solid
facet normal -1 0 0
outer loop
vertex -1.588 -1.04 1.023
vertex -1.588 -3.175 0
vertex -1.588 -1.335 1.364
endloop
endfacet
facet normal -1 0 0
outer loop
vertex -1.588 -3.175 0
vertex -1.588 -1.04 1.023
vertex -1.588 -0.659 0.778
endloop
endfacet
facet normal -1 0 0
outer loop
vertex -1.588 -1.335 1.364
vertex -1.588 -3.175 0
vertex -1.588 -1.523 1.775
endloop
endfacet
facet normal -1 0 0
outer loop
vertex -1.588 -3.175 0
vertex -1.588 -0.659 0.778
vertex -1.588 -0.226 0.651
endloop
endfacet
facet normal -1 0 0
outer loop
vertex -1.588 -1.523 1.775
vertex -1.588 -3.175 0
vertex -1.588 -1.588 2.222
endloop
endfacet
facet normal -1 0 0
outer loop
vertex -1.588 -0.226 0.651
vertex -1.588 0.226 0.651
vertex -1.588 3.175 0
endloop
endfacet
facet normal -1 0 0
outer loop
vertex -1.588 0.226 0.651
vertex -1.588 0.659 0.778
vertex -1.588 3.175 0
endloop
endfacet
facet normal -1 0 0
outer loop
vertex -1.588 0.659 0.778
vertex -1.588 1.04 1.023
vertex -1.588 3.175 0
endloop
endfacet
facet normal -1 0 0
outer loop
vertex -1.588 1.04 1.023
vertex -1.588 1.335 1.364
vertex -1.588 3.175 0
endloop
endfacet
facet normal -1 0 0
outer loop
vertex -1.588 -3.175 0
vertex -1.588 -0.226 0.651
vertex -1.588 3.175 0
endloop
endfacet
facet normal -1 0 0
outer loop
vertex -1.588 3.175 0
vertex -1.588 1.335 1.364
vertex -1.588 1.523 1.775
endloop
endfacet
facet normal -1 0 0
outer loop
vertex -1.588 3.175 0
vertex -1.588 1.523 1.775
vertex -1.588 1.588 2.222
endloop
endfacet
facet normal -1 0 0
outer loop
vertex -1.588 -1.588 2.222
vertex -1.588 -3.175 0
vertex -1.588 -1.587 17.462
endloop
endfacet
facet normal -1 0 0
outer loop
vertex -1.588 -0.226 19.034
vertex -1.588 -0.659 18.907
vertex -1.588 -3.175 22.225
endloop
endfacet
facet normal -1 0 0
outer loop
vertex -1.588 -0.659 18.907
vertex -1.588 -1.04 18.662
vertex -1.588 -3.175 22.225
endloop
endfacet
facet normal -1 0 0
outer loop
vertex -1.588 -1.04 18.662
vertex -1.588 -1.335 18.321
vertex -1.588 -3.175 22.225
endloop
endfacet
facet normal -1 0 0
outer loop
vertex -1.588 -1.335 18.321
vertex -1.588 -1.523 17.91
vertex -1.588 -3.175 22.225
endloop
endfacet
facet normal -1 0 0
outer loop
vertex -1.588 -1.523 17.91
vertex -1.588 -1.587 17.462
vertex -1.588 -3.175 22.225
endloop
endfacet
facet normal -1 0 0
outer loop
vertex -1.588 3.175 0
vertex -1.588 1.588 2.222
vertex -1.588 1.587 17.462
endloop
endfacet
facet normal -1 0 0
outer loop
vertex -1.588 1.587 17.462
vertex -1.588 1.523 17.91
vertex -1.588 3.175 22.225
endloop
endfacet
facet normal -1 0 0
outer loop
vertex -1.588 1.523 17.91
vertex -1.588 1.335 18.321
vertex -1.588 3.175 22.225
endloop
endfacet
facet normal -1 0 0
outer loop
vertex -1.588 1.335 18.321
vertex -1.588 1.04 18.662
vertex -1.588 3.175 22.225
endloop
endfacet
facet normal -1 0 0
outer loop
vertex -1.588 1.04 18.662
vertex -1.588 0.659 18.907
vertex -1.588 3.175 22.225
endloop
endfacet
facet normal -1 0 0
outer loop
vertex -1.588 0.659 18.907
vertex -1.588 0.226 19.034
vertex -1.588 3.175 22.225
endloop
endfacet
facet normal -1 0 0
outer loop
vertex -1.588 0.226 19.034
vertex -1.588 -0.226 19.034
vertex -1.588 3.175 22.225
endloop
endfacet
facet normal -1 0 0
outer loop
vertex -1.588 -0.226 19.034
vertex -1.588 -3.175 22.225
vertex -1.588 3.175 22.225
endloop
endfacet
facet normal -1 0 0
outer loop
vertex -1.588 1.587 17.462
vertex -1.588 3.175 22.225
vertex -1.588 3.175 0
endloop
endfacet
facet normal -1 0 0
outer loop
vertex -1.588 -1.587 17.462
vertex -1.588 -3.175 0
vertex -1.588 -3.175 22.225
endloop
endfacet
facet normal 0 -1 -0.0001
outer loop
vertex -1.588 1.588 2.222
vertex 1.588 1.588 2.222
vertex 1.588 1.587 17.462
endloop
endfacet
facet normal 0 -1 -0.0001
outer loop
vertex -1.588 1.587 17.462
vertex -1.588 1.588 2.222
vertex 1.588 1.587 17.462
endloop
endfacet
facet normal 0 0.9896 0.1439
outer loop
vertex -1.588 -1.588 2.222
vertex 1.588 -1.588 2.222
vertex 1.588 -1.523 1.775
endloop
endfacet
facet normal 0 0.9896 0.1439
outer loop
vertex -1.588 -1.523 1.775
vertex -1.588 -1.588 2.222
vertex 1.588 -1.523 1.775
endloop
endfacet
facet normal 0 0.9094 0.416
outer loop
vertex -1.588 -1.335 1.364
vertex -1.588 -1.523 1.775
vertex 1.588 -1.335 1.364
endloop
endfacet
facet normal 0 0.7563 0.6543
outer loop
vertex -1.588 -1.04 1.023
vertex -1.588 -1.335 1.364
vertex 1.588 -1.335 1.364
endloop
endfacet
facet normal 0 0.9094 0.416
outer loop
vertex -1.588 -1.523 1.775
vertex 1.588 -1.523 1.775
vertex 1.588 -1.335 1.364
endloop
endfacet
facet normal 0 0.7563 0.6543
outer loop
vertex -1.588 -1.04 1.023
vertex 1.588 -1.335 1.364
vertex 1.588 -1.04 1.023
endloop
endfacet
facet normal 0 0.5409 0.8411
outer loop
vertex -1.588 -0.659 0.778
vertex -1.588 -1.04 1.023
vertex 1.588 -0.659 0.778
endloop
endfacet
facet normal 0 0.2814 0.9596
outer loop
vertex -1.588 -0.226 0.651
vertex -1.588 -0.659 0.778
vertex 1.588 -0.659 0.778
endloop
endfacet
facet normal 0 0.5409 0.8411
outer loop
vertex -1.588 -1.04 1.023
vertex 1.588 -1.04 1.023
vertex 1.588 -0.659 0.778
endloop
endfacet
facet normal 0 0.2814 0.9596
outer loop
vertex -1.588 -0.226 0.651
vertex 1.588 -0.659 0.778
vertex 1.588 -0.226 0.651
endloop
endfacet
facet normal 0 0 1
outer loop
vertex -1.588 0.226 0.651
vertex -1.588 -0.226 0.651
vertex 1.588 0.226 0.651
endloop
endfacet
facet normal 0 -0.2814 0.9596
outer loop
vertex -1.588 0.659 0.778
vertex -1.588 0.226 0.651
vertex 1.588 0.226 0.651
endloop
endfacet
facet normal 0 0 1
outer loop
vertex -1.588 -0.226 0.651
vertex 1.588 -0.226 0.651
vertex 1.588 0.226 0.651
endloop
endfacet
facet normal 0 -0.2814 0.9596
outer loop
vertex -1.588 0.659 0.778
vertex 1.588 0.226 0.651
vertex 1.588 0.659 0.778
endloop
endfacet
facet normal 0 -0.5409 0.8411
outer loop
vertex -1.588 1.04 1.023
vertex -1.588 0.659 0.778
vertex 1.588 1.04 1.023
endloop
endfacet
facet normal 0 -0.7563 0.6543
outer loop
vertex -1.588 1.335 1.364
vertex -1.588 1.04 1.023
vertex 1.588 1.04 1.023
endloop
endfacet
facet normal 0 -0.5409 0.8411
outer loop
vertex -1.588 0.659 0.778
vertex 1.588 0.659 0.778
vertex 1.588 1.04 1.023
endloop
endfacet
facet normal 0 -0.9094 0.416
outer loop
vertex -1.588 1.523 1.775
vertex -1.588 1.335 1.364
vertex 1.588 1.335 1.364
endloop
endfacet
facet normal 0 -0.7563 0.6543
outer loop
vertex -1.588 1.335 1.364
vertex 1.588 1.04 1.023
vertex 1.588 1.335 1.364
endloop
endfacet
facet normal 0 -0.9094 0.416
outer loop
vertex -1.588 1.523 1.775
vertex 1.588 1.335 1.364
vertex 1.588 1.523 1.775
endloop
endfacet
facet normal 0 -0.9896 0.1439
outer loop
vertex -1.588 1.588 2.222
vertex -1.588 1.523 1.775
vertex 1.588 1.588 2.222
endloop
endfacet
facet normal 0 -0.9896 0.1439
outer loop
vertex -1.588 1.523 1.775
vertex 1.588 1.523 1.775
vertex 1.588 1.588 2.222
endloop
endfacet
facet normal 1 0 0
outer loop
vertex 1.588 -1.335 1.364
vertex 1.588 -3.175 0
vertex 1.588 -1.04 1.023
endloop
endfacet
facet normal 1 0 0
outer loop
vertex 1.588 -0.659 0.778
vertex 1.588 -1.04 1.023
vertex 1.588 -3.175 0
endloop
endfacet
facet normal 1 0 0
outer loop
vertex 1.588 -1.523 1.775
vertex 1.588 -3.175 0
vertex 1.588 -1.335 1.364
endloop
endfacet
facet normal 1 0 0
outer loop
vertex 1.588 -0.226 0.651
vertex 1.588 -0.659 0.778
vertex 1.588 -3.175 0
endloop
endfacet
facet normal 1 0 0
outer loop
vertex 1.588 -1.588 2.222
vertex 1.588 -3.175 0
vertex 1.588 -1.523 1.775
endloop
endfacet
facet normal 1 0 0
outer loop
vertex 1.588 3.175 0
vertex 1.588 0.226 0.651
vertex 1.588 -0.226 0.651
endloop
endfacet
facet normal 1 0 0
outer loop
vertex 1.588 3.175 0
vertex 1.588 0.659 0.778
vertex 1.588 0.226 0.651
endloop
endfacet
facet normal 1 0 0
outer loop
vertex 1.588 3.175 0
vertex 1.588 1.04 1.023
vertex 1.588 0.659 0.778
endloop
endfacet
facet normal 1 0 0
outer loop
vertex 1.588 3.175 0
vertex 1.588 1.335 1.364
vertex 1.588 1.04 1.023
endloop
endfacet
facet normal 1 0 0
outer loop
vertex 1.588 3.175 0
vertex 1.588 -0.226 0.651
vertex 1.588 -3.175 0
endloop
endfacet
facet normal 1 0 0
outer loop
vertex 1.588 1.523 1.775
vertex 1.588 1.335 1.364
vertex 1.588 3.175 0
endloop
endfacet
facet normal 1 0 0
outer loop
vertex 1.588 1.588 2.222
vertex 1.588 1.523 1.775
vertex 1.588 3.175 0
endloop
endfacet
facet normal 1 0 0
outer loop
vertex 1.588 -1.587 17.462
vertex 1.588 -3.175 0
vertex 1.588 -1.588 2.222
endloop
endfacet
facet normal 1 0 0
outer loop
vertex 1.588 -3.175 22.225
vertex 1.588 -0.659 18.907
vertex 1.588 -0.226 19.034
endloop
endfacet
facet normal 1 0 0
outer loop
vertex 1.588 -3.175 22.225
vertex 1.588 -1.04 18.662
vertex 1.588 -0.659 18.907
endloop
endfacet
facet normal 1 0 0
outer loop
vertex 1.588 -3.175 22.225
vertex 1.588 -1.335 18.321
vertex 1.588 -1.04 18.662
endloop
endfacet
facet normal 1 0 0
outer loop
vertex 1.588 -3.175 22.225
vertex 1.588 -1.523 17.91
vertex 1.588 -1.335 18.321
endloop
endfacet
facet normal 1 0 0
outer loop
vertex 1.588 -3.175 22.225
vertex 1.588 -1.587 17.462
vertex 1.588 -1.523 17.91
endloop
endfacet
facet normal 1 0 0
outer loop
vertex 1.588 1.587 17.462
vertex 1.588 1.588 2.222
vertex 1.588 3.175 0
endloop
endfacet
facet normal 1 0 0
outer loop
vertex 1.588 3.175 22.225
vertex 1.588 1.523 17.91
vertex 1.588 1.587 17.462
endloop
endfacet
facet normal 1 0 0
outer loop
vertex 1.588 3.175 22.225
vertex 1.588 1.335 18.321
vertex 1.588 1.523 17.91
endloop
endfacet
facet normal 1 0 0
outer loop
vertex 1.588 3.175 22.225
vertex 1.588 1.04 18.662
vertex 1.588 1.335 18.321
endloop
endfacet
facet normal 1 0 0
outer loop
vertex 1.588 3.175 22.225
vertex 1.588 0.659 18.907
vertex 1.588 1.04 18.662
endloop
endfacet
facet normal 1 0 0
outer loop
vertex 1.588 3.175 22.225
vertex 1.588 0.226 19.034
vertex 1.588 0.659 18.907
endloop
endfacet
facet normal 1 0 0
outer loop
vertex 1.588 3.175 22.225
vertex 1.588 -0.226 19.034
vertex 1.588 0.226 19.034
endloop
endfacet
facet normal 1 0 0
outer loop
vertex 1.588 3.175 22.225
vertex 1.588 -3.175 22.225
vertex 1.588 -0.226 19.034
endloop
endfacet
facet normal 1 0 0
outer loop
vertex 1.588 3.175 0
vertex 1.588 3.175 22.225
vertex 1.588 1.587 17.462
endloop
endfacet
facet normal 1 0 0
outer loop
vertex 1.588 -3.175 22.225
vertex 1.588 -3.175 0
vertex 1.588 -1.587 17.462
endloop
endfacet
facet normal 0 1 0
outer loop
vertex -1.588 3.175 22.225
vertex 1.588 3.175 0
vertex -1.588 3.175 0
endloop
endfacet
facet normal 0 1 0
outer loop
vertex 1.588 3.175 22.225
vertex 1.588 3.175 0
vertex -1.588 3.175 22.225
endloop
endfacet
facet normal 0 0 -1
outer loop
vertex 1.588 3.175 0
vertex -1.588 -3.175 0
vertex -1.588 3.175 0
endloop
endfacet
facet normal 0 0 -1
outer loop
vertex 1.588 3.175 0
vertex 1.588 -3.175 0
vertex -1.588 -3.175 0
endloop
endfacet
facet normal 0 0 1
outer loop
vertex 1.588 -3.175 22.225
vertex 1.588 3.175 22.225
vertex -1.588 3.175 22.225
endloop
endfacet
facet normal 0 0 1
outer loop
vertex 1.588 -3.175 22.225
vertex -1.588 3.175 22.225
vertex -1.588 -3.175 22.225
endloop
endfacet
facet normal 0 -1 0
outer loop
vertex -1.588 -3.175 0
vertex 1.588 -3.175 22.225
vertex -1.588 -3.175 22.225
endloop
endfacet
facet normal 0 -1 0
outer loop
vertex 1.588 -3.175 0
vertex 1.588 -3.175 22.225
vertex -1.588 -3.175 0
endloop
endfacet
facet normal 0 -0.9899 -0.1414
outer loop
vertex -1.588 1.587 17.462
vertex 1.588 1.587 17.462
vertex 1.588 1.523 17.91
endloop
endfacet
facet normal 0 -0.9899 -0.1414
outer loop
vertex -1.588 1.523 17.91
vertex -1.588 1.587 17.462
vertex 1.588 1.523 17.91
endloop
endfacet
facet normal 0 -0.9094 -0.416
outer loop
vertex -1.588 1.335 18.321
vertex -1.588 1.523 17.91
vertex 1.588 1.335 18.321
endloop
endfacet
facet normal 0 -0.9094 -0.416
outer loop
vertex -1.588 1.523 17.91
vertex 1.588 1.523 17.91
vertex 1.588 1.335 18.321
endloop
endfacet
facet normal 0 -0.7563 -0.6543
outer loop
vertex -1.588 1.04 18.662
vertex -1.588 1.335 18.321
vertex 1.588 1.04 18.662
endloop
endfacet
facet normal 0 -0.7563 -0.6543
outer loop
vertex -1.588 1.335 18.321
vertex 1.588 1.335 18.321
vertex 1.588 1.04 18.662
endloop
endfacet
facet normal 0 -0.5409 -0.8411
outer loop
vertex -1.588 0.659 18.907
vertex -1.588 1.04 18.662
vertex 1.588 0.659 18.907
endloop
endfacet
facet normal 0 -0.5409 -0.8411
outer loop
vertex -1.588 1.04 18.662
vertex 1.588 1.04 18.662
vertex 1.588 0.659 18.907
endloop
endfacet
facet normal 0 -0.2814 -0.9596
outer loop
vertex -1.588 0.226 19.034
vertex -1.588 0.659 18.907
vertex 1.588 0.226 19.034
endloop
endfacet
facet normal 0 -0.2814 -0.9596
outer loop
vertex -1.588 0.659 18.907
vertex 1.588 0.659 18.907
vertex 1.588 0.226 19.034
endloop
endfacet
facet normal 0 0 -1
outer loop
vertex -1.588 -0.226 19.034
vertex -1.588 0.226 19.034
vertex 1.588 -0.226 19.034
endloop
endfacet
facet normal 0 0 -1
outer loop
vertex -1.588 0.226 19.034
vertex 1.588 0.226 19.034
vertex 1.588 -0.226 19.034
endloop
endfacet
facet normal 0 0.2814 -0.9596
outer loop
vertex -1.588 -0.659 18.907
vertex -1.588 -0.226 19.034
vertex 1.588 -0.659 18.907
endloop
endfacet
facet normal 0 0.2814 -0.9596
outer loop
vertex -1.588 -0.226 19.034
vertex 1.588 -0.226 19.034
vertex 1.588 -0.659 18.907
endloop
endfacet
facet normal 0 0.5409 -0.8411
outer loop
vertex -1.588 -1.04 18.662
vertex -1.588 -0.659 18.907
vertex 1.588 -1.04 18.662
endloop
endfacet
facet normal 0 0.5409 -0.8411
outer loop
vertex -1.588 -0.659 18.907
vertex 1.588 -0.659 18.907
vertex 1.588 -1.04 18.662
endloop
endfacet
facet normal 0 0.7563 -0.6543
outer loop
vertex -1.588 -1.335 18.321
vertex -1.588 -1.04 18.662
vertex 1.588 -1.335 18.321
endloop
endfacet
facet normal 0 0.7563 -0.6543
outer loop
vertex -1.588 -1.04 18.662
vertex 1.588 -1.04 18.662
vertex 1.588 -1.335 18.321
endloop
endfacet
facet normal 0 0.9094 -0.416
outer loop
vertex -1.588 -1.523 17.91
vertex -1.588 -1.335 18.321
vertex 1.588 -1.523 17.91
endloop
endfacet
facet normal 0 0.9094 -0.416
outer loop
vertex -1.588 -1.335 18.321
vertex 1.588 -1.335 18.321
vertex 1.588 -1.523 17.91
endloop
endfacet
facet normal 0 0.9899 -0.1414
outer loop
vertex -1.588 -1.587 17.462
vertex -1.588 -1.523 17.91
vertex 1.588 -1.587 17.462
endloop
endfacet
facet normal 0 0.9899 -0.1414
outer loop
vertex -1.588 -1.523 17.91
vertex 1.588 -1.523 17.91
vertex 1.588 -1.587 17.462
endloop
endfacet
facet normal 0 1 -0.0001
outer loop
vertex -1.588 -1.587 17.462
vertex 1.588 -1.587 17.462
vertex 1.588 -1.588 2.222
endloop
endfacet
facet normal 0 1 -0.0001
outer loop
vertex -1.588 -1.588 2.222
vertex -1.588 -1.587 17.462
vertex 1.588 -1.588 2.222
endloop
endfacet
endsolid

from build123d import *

# Parameters (mm, degrees)
F1_DEPTH = 1.5875
F3_DEPTH = 3.176


with BuildPart() as f1:
    # F0 (on Right) → F1 (new body, symmetric)
    with BuildSketch(Plane.YZ):
        Polygon((-3.175, 0), (0, 0), (3.175, 0), (3.175, 22.225), (-3.175, 22.225), align=None)
    extrude(amount=F1_DEPTH, both=True)

    # F2 (on face) → F3 (cut, through all)
    with BuildSketch(Plane.YZ.offset(1.5875)):
        with BuildLine():
            ThreePointArc((1.5875, 17.4625), (0, 19.05), (-1.5875, 17.4625))
            Line((-1.5875, 17.4625), (-1.5875, 2.2225))
            ThreePointArc((-1.5875, 2.2225), (0, 0.635), (1.5875, 2.2225))
            Line((1.5875, 2.2225), (1.5875, 17.4625))
        make_face()
    extrude(amount=-F3_DEPTH, mode=Mode.SUBTRACT)


solid = f1.part
